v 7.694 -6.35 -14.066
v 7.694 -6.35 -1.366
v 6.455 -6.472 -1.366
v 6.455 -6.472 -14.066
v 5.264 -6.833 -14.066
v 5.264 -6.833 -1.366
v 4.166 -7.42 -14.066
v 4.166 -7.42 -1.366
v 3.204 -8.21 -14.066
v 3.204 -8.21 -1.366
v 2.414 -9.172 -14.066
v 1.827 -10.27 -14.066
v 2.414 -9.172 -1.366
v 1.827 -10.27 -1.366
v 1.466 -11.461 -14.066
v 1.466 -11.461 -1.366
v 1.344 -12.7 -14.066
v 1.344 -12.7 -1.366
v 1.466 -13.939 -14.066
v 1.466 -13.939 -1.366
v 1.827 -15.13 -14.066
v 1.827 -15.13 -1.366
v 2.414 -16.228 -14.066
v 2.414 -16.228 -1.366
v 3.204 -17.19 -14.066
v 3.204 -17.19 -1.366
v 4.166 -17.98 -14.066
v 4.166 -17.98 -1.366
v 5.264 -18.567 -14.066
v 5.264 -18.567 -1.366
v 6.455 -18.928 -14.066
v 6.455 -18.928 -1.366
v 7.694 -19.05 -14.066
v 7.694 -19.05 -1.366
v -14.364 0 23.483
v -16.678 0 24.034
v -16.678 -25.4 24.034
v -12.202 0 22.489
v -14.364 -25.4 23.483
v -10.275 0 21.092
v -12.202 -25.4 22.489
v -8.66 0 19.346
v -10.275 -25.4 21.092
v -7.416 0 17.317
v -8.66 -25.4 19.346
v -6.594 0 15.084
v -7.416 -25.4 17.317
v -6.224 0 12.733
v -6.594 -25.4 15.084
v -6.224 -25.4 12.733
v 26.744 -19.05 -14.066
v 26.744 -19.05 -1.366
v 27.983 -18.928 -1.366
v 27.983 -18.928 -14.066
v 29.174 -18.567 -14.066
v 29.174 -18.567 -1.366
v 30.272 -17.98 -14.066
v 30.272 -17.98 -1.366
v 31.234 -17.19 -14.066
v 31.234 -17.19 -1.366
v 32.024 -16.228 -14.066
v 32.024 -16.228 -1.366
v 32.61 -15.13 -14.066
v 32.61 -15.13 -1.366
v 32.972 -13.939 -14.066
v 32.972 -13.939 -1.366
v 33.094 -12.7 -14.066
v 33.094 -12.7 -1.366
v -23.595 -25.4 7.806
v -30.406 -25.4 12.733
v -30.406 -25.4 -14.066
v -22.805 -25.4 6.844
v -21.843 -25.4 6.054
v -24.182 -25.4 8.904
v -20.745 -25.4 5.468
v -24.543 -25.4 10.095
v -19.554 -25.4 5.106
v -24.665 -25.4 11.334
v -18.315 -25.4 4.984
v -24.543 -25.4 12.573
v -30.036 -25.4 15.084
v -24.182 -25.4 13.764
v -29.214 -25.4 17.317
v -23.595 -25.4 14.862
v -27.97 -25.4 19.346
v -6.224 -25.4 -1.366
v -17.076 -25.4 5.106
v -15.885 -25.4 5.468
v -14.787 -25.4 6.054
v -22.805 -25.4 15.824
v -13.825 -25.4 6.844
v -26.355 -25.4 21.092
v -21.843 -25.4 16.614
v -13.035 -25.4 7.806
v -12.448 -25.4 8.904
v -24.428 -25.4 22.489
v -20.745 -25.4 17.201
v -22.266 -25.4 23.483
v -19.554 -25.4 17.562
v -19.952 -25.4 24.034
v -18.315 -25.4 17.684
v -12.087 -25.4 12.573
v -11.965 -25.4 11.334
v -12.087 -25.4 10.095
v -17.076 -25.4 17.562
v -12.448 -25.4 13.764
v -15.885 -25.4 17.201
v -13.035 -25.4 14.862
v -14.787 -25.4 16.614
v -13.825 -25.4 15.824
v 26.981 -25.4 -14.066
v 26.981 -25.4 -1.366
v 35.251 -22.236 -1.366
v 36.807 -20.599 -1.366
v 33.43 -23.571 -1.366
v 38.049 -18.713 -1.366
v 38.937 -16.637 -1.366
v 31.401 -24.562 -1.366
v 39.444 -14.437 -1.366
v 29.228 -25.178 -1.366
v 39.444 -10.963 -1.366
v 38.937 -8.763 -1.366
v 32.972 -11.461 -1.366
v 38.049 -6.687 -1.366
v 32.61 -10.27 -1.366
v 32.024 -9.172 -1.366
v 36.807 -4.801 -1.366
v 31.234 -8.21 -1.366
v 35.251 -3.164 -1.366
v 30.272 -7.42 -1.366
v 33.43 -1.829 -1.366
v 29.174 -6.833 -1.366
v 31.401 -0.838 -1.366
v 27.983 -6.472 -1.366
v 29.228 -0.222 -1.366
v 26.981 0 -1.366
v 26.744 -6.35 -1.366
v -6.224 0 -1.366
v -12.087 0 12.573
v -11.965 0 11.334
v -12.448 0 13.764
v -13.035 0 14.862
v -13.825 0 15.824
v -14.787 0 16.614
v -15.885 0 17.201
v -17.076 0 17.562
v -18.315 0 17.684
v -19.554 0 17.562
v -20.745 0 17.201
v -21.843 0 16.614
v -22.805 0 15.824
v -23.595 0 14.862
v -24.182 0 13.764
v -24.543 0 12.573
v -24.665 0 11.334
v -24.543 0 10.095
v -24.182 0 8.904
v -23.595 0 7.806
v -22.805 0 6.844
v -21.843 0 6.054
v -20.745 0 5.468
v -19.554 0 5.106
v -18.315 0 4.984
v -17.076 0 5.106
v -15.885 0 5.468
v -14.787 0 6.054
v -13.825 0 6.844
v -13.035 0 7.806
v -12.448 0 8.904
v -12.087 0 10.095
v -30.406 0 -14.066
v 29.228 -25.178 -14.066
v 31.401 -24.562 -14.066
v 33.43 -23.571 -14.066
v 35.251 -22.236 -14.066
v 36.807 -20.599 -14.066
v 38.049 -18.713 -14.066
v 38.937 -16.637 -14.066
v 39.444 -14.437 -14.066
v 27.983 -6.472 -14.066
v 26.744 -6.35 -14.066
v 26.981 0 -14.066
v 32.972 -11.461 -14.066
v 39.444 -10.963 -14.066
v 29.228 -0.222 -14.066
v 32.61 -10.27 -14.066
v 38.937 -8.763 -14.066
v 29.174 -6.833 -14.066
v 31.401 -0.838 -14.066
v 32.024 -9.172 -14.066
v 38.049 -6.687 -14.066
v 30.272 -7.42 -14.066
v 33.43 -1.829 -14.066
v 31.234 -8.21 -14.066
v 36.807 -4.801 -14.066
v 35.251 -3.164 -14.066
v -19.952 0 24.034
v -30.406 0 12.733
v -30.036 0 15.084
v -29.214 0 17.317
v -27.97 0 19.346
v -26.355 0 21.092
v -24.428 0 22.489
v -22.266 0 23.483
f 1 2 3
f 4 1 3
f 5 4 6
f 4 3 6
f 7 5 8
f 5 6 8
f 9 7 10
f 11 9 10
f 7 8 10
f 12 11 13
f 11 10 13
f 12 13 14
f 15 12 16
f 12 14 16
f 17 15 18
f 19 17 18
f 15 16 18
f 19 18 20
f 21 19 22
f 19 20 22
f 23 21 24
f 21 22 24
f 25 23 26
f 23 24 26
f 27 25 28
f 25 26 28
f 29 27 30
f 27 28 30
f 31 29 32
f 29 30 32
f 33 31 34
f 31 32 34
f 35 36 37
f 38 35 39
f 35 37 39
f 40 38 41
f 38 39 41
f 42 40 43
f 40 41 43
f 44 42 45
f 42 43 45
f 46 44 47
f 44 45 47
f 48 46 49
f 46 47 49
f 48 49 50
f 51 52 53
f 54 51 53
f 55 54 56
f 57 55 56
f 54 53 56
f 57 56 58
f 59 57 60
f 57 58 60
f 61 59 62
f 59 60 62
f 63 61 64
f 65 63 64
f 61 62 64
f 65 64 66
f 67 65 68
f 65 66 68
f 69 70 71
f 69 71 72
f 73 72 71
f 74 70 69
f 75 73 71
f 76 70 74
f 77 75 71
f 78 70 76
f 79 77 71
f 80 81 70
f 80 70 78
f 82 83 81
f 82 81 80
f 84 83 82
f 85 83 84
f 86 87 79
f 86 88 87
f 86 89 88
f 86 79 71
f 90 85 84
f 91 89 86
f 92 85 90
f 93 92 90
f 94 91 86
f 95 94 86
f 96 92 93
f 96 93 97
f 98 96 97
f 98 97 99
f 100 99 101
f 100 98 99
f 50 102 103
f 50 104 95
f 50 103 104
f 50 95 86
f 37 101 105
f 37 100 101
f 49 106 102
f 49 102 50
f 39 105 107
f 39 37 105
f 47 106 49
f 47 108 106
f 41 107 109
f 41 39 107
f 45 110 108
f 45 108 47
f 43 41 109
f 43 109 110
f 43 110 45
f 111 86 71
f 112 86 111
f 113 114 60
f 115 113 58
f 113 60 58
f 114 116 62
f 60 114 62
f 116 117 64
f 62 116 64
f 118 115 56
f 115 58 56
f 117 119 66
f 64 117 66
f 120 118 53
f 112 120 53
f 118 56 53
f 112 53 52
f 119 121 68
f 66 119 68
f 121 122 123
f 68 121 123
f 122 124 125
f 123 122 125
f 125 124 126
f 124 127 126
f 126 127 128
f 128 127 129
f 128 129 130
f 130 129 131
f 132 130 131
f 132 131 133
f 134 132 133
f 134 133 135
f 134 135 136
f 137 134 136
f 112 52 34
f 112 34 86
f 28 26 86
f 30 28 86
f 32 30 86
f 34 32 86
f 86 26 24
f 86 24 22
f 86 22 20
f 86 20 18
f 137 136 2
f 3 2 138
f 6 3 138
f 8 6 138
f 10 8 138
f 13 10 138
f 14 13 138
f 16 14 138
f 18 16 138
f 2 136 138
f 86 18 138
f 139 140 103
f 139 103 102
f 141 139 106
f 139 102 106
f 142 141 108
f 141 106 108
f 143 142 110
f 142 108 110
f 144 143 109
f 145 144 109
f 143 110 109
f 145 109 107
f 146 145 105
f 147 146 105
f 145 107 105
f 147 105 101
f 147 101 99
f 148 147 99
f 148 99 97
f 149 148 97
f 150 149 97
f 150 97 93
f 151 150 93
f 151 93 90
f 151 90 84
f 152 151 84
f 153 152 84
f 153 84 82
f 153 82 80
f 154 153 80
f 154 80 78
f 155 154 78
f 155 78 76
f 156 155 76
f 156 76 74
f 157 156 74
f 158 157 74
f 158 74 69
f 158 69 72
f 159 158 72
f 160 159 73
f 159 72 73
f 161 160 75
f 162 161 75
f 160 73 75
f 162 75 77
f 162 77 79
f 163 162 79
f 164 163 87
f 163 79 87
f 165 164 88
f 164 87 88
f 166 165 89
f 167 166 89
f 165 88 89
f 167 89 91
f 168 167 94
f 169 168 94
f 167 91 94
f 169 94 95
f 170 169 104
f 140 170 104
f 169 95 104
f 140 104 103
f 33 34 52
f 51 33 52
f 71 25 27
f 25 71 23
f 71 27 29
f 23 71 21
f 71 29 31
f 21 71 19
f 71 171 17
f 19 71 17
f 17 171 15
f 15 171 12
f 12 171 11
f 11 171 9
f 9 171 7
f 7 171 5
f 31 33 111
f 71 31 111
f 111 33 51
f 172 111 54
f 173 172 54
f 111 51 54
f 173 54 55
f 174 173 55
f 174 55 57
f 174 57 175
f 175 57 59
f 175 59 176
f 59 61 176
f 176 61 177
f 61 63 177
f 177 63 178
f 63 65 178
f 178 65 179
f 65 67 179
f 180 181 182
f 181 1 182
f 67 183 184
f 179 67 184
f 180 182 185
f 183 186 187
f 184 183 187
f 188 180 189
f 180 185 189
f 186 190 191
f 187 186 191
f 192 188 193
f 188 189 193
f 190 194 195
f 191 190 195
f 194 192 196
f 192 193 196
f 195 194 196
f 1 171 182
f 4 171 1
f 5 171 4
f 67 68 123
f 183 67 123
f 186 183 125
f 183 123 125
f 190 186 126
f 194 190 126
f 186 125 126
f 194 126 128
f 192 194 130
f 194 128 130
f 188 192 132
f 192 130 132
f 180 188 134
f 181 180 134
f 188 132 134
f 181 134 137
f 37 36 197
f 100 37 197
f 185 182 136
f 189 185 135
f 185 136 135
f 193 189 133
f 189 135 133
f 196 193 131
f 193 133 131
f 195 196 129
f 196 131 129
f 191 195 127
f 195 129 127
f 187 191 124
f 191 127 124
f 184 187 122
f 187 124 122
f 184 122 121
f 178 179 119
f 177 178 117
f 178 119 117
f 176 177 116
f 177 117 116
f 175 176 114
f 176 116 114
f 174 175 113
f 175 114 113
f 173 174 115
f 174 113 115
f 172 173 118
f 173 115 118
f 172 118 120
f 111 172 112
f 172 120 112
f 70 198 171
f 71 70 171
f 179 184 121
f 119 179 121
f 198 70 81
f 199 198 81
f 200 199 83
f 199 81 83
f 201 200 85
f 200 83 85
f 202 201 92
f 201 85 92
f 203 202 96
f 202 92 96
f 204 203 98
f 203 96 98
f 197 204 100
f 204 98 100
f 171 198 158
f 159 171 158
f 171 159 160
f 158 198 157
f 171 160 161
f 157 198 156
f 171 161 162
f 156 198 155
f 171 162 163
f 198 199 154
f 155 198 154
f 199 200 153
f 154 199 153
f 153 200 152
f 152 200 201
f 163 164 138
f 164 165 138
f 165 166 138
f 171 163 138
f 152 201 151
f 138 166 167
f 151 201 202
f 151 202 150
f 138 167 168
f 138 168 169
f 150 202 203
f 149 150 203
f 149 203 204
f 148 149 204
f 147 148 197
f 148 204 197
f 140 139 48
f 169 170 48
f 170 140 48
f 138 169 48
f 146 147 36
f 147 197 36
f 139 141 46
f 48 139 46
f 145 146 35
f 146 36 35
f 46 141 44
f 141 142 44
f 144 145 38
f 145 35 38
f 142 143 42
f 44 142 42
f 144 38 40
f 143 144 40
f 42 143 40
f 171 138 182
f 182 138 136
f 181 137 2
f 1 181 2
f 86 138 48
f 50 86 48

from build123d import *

# Parameters (mm, degrees)
F1_DEPTH = 25.4
F3_DEPTH = 25.401
F5_DEPTH = 12.701


with BuildPart() as f1:
    # F0 (on Front) → F1 (new body)
    with BuildSketch(Plane.XZ):
        Polygon((-6.2236683385, 24.0342710525), (-30.4063118957, 24.0342710525), (-30.4063118957, -14.0657289475), (39.4436881043, -14.0657289475), (39.4436881043, -1.3657289475), (-6.2236683385, -1.3657289475), align=None)
    extrude(amount=F1_DEPTH)

    # F2 (on face) → F3 (cut, through all)
    with BuildSketch(Plane.XZ.offset(25.4)):
        with BuildLine():
            ThreePointArc((-24.6649901171, 11.3342710525), (-18.3149901171, 4.9842710525), (-11.9649901171, 11.3342710525))
            Line((-11.9649901171, 11.3342710525), (-24.6649901171, 11.3342710525))
        make_face()
        with BuildLine():
            Line((-24.6649901171, 11.3342710525), (-11.9649901171, 11.3342710525))
            ThreePointArc((-11.9649901171, 11.3342710525), (-18.3149901171, 17.6842710525), (-24.6649901171, 11.3342710525))
        make_face()
        with BuildLine():
            Line((-6.2236683385, 12.7333663785), (-6.2236683385, 11.3342710525))
            ThreePointArc((-6.2236683385, 11.3342710525), (-6.2034489564, 12.0338187155), (-6.2236683385, 12.7333663785))
        make_face()
        with BuildLine():
            ThreePointArc((-16.678355462, 24.0342710525), (-9.4244440948, 20.258636082), (-6.2236683385, 12.7333663785))
            Line((-6.2236683385, 12.7333663785), (-6.2236683385, 24.0342710525))
            Line((-6.2236683385, 24.0342710525), (-16.678355462, 24.0342710525))
        make_face()
        with BuildLine():
            ThreePointArc((-30.4063118957, 12.7333663785), (-30.4265312777, 12.0338187155), (-30.4063118957, 11.3342710525))
            Line((-30.4063118957, 11.3342710525), (-30.4063118957, 12.7333663785))
        make_face()
        with BuildLine():
            Line((-19.9516247721, 24.0342710525), (-16.678355462, 24.0342710525))
            ThreePointArc((-16.678355462, 24.0342710525), (-18.3149901171, 24.1453598762), (-19.9516247721, 24.0342710525))
        make_face()
        with BuildLine():
            Line((-30.4063118957, 24.0342710525), (-30.4063118957, 12.7333663785))
            ThreePointArc((-30.4063118957, 12.7333663785), (-27.2055361393, 20.258636082), (-19.9516247721, 24.0342710525))
            Line((-19.9516247721, 24.0342710525), (-30.4063118957, 24.0342710525))
        make_face()
    extrude(amount=-F3_DEPTH, mode=Mode.SUBTRACT)

    # F4 (on face) → F5 (cut, through all)
    with BuildSketch(Plane.XY.offset(-1.3657289475)):
        with BuildLine():
            ThreePointArc((33.0936881043, -12.7), (31.2338161649, -8.2098719395), (26.7436881043, -6.35))
            Line((26.7436881043, -6.35), (26.7436881043, -19.05))
            ThreePointArc((26.7436881043, -19.05), (31.2338161649, -17.1901280605), (33.0936881043, -12.7))
        make_face()
        with BuildLine():
            Line((26.7436881043, -19.05), (26.7436881043, -6.35))
            ThreePointArc((26.7436881043, -6.35), (20.3936881043, -12.7), (26.7436881043, -19.05))
        make_face()
        with BuildLine():
            ThreePointArc((26.7436881043, -19.05), (20.3936881043, -12.7), (26.7436881043, -6.35))
            Line((26.7436881043, -6.35), (7.6936881043, -6.35))
            ThreePointArc((7.6936881043, -6.35), (12.1838161649, -8.2098719395), (14.0436881043, -12.7))
            ThreePointArc((14.0436881043, -12.7), (12.1838161649, -17.1901280605), (7.6936881043, -19.05))
            Line((7.6936881043, -19.05), (26.7436881043, -19.05))
        make_face()
        with BuildLine():
            Line((39.4436881043, 0), (26.981144502, 0))
            ThreePointArc((26.981144502, 0), (35.251198478, -3.1641502734), (39.4436881043, -10.9634239866))
            Line((39.4436881043, -10.9634239866), (39.4436881043, 0))
        make_face()
        with BuildLine():
            ThreePointArc((14.0436881043, -12.7), (12.1838161649, -8.2098719395), (7.6936881043, -6.35))
            Line((7.6936881043, -6.35), (7.6936881043, -19.05))
            ThreePointArc((7.6936881043, -19.05), (12.1838161649, -17.1901280605), (14.0436881043, -12.7))
        make_face()
        with BuildLine():
            Line((7.6936881043, -19.05), (7.6936881043, -6.35))
            ThreePointArc((7.6936881043, -6.35), (1.3436881043, -12.7), (7.6936881043, -19.05))
        make_face()
        with BuildLine():
            ThreePointArc((39.4436881043, -14.4365760134), (39.5629712668, -12.7), (39.4436881043, -10.9634239866))
            Line((39.4436881043, -10.9634239866), (39.4436881043, -14.4365760134))
        make_face()
        with BuildLine():
            Line((39.4436881043, -25.4), (39.4436881043, -14.4365760134))
            ThreePointArc((39.4436881043, -14.4365760134), (35.251198478, -22.2358497266), (26.981144502, -25.4))
            Line((26.981144502, -25.4), (39.4436881043, -25.4))
        make_face()
    extrude(amount=-F5_DEPTH, mode=Mode.SUBTRACT)


solid = f1.part
